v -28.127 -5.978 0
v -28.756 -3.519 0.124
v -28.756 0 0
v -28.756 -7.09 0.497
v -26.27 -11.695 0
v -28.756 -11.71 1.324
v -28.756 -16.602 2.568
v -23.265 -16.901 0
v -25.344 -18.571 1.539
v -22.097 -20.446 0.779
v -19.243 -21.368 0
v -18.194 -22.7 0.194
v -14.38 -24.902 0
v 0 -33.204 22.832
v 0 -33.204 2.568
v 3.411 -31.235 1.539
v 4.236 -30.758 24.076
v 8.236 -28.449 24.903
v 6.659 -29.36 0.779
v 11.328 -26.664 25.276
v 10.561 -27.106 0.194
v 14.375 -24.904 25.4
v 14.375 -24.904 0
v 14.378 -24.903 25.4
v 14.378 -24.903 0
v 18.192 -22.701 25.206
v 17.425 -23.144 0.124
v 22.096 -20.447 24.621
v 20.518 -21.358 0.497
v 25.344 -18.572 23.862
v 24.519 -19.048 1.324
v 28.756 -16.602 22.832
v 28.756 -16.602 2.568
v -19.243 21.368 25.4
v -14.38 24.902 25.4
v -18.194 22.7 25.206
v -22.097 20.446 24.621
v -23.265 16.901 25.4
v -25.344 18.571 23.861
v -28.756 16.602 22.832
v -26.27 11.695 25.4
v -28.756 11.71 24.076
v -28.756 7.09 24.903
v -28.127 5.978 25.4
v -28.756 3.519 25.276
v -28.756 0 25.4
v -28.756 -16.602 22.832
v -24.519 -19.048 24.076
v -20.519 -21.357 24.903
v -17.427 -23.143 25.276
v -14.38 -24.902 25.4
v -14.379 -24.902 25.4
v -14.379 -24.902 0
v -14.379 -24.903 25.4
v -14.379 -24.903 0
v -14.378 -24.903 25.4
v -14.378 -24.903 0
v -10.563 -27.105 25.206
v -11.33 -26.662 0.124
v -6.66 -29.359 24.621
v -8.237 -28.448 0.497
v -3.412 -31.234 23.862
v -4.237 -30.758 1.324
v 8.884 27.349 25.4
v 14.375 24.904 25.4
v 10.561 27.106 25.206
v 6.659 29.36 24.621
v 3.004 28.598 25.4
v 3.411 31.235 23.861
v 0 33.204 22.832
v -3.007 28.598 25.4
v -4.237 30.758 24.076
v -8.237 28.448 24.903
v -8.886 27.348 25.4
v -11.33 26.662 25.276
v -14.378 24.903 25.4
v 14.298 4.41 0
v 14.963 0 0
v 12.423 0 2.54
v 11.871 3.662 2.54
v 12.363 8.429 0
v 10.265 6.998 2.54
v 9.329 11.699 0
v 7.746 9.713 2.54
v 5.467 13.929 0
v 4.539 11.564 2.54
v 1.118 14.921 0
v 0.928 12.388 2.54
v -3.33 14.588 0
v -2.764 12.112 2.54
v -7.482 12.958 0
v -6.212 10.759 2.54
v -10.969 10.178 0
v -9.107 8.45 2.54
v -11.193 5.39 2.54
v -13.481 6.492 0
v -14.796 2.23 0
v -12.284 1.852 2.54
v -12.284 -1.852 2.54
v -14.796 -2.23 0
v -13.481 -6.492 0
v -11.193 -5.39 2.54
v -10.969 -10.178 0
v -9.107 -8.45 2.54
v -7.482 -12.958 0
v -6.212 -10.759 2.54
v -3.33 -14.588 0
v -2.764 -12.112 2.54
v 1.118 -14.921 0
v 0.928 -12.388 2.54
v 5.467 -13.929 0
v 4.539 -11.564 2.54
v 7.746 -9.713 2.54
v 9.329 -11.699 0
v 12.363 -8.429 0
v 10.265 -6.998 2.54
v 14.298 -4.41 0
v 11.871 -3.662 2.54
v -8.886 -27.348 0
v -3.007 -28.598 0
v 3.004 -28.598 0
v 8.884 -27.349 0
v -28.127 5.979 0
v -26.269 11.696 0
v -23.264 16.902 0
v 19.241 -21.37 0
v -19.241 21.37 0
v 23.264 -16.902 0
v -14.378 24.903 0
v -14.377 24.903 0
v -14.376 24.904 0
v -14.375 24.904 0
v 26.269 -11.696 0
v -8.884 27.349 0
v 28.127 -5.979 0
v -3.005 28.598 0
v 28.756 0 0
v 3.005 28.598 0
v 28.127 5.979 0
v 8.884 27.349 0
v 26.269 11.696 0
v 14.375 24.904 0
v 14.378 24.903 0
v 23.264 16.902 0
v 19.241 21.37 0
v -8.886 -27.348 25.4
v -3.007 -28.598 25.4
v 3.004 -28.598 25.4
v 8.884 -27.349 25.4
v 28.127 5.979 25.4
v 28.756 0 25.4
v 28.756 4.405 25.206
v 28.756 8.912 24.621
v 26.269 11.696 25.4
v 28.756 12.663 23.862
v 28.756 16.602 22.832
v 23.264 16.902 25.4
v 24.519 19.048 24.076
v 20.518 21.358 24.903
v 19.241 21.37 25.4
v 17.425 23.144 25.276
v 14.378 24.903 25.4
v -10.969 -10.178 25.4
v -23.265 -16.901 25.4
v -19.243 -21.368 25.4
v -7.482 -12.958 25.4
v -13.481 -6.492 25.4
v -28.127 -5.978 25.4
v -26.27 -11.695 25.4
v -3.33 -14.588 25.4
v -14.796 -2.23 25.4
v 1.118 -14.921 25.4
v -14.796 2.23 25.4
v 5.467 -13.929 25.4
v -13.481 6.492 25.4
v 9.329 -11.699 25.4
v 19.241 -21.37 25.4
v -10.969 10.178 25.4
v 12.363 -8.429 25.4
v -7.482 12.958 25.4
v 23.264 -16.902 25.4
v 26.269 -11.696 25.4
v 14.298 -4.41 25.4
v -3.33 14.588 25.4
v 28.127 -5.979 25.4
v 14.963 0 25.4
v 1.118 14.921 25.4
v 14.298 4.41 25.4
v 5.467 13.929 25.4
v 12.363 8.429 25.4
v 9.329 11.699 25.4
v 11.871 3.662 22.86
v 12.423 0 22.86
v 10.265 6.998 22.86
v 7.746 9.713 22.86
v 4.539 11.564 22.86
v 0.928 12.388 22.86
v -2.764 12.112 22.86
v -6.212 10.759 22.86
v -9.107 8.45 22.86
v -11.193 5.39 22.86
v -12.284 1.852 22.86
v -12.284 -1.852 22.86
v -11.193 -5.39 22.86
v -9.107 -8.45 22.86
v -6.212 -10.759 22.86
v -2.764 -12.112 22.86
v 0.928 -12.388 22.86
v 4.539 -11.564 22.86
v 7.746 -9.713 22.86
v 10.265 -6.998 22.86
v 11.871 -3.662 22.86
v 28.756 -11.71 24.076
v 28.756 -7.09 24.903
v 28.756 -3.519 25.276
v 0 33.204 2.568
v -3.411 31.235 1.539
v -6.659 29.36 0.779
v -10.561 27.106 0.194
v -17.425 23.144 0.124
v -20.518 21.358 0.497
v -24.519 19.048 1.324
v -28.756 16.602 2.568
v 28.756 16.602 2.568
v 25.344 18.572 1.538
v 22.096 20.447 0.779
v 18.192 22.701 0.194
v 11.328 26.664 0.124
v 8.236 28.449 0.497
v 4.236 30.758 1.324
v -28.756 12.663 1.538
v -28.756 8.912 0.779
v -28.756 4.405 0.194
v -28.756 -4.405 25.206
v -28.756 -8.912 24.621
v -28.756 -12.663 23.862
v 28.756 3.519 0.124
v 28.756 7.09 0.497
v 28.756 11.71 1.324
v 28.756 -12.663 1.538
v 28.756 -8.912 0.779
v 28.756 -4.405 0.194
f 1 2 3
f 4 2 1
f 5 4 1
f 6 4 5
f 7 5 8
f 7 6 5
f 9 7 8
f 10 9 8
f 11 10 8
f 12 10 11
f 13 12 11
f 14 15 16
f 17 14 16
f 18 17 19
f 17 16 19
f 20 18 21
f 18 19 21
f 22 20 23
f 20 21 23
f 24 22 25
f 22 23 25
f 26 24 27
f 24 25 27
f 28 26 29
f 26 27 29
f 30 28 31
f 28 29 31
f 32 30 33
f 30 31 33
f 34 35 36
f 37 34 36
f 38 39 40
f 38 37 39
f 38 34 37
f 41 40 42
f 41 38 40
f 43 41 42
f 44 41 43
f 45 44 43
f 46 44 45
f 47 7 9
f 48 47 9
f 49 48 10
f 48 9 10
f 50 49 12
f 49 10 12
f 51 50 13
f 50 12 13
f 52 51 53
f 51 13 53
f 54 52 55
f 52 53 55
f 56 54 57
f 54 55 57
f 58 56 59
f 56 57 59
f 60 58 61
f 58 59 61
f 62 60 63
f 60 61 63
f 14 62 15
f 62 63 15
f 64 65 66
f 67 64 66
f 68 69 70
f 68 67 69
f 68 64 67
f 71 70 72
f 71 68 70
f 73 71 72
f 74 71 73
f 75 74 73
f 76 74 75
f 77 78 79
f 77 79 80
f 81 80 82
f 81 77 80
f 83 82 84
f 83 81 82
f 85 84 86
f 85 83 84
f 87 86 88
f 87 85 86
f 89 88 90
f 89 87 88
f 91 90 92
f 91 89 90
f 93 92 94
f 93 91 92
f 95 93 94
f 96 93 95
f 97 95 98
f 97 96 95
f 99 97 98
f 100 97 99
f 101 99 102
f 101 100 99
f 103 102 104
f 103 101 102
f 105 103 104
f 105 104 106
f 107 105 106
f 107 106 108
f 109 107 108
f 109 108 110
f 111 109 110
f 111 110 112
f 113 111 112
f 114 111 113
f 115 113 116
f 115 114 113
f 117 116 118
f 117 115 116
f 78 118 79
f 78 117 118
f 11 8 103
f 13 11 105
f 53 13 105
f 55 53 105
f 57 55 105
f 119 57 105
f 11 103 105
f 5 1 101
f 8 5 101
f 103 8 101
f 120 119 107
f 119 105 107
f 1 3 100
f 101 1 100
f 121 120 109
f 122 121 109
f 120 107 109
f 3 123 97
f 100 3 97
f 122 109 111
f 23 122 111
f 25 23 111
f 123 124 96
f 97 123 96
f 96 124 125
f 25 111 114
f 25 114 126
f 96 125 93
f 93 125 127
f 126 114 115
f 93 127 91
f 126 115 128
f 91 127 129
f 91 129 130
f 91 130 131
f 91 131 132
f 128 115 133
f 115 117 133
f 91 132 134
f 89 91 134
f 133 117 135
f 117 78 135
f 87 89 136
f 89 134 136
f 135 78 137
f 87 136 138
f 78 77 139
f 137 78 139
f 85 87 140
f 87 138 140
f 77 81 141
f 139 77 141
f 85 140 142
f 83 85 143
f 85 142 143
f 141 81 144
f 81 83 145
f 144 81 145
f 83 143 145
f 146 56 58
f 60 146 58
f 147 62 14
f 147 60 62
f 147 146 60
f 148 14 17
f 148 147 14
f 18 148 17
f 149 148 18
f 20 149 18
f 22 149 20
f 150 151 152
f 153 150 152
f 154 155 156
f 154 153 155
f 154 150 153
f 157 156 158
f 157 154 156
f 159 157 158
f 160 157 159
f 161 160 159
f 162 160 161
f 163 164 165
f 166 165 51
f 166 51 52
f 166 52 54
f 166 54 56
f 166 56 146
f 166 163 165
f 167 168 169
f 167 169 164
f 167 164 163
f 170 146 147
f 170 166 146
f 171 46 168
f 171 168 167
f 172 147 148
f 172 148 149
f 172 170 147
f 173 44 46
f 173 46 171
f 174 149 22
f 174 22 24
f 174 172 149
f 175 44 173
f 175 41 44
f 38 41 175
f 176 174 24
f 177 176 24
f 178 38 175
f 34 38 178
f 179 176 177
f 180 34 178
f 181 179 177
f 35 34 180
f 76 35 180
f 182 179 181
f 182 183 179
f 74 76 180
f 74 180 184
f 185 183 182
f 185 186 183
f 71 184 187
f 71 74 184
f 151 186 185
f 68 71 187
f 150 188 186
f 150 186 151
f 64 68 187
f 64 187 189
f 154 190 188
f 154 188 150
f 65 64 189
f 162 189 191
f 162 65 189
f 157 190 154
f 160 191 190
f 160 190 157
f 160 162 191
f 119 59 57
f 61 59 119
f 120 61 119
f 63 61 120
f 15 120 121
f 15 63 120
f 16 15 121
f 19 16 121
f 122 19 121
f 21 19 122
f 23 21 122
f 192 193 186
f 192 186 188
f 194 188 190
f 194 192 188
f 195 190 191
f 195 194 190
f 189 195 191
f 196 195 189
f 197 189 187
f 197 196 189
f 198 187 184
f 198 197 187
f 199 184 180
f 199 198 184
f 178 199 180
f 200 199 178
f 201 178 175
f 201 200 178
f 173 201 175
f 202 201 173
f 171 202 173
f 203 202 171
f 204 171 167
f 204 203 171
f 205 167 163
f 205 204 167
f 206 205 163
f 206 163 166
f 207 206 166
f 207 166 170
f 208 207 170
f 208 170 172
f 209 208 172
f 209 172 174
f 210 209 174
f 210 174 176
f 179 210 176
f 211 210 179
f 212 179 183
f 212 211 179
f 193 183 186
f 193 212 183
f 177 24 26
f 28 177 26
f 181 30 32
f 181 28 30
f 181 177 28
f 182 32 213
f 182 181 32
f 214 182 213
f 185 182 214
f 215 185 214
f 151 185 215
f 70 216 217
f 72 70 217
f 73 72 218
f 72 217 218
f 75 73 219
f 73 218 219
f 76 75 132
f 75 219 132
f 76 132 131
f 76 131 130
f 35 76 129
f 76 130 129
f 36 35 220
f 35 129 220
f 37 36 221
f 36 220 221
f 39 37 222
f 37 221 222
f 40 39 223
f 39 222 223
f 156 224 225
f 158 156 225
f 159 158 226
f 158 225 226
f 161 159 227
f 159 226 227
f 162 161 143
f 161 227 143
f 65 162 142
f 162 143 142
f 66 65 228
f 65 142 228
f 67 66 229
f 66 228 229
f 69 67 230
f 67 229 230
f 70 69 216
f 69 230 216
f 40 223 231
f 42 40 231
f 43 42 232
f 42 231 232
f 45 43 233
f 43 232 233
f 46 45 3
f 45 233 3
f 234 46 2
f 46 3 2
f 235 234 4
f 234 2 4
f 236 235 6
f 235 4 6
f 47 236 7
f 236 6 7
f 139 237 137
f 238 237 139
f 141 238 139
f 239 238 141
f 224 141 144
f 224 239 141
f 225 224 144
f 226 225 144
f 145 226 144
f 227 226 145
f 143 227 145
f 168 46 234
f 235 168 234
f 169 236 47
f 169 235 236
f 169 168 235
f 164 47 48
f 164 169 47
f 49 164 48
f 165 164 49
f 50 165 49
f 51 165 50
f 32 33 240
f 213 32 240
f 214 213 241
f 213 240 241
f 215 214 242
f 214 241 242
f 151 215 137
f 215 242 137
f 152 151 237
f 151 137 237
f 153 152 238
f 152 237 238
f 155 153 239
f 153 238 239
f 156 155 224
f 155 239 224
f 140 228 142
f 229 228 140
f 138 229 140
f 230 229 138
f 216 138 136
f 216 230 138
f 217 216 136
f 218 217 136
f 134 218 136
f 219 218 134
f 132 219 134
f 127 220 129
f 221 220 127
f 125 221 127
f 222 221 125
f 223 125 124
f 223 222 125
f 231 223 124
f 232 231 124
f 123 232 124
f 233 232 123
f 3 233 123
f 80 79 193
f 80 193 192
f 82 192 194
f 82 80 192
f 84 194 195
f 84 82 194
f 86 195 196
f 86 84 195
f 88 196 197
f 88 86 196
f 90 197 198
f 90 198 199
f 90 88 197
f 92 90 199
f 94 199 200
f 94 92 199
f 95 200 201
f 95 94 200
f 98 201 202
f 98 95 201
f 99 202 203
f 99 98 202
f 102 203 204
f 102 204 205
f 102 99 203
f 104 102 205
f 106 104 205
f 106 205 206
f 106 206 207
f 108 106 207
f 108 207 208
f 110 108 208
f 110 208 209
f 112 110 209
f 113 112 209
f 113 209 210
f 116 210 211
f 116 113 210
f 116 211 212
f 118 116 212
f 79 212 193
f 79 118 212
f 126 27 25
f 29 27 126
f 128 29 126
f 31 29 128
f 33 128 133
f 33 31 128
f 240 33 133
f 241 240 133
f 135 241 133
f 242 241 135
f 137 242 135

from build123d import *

# Parameters (mm, degrees)
F0_R     = 12.423166
F1_DEPTH = 25.4
F4_SIZE  = 2.54
F5_SIZE  = 2.54


with BuildPart() as f1:
    # F0 (on Top) → F1 (new body)
    with BuildSketch(Plane.XY):
        Polygon((-28.755525, 16.60201), (-28.755525, -16.60201), (0, -33.20402), (28.755525, -16.60201), (28.755525, 16.60201), (0, 33.20402), align=None)
        Circle(F0_R, mode=Mode.SUBTRACT)
    extrude(amount=F1_DEPTH)

    # F2 (on Front) → F3 (revolve, cut)
    with BuildSketch(Plane.XZ):
        Polygon((-47.010668, 14.860389), (-28.755525, 25.4), (-47.010668, 25.4), align=None)
        Polygon((-47.010668, 0), (-28.755525, 0), (-47.010668, 10.539611), align=None)
    revolve(axis=Axis((0, 0, 12.7), (0, 0, 1)), mode=Mode.SUBTRACT)

    # F4
    f4_edges = [f1.edges().sort_by_distance(p)[0] for p in [
        (-12.423166, 0, 25.4),
    ]]
    chamfer(f4_edges, length=F4_SIZE)

    # F5
    f5_edges = [f1.edges().sort_by_distance(p)[0] for p in [
        (-12.423166, 0, 0),
    ]]
    chamfer(f5_edges, length=F5_SIZE)


solid = f1.part
